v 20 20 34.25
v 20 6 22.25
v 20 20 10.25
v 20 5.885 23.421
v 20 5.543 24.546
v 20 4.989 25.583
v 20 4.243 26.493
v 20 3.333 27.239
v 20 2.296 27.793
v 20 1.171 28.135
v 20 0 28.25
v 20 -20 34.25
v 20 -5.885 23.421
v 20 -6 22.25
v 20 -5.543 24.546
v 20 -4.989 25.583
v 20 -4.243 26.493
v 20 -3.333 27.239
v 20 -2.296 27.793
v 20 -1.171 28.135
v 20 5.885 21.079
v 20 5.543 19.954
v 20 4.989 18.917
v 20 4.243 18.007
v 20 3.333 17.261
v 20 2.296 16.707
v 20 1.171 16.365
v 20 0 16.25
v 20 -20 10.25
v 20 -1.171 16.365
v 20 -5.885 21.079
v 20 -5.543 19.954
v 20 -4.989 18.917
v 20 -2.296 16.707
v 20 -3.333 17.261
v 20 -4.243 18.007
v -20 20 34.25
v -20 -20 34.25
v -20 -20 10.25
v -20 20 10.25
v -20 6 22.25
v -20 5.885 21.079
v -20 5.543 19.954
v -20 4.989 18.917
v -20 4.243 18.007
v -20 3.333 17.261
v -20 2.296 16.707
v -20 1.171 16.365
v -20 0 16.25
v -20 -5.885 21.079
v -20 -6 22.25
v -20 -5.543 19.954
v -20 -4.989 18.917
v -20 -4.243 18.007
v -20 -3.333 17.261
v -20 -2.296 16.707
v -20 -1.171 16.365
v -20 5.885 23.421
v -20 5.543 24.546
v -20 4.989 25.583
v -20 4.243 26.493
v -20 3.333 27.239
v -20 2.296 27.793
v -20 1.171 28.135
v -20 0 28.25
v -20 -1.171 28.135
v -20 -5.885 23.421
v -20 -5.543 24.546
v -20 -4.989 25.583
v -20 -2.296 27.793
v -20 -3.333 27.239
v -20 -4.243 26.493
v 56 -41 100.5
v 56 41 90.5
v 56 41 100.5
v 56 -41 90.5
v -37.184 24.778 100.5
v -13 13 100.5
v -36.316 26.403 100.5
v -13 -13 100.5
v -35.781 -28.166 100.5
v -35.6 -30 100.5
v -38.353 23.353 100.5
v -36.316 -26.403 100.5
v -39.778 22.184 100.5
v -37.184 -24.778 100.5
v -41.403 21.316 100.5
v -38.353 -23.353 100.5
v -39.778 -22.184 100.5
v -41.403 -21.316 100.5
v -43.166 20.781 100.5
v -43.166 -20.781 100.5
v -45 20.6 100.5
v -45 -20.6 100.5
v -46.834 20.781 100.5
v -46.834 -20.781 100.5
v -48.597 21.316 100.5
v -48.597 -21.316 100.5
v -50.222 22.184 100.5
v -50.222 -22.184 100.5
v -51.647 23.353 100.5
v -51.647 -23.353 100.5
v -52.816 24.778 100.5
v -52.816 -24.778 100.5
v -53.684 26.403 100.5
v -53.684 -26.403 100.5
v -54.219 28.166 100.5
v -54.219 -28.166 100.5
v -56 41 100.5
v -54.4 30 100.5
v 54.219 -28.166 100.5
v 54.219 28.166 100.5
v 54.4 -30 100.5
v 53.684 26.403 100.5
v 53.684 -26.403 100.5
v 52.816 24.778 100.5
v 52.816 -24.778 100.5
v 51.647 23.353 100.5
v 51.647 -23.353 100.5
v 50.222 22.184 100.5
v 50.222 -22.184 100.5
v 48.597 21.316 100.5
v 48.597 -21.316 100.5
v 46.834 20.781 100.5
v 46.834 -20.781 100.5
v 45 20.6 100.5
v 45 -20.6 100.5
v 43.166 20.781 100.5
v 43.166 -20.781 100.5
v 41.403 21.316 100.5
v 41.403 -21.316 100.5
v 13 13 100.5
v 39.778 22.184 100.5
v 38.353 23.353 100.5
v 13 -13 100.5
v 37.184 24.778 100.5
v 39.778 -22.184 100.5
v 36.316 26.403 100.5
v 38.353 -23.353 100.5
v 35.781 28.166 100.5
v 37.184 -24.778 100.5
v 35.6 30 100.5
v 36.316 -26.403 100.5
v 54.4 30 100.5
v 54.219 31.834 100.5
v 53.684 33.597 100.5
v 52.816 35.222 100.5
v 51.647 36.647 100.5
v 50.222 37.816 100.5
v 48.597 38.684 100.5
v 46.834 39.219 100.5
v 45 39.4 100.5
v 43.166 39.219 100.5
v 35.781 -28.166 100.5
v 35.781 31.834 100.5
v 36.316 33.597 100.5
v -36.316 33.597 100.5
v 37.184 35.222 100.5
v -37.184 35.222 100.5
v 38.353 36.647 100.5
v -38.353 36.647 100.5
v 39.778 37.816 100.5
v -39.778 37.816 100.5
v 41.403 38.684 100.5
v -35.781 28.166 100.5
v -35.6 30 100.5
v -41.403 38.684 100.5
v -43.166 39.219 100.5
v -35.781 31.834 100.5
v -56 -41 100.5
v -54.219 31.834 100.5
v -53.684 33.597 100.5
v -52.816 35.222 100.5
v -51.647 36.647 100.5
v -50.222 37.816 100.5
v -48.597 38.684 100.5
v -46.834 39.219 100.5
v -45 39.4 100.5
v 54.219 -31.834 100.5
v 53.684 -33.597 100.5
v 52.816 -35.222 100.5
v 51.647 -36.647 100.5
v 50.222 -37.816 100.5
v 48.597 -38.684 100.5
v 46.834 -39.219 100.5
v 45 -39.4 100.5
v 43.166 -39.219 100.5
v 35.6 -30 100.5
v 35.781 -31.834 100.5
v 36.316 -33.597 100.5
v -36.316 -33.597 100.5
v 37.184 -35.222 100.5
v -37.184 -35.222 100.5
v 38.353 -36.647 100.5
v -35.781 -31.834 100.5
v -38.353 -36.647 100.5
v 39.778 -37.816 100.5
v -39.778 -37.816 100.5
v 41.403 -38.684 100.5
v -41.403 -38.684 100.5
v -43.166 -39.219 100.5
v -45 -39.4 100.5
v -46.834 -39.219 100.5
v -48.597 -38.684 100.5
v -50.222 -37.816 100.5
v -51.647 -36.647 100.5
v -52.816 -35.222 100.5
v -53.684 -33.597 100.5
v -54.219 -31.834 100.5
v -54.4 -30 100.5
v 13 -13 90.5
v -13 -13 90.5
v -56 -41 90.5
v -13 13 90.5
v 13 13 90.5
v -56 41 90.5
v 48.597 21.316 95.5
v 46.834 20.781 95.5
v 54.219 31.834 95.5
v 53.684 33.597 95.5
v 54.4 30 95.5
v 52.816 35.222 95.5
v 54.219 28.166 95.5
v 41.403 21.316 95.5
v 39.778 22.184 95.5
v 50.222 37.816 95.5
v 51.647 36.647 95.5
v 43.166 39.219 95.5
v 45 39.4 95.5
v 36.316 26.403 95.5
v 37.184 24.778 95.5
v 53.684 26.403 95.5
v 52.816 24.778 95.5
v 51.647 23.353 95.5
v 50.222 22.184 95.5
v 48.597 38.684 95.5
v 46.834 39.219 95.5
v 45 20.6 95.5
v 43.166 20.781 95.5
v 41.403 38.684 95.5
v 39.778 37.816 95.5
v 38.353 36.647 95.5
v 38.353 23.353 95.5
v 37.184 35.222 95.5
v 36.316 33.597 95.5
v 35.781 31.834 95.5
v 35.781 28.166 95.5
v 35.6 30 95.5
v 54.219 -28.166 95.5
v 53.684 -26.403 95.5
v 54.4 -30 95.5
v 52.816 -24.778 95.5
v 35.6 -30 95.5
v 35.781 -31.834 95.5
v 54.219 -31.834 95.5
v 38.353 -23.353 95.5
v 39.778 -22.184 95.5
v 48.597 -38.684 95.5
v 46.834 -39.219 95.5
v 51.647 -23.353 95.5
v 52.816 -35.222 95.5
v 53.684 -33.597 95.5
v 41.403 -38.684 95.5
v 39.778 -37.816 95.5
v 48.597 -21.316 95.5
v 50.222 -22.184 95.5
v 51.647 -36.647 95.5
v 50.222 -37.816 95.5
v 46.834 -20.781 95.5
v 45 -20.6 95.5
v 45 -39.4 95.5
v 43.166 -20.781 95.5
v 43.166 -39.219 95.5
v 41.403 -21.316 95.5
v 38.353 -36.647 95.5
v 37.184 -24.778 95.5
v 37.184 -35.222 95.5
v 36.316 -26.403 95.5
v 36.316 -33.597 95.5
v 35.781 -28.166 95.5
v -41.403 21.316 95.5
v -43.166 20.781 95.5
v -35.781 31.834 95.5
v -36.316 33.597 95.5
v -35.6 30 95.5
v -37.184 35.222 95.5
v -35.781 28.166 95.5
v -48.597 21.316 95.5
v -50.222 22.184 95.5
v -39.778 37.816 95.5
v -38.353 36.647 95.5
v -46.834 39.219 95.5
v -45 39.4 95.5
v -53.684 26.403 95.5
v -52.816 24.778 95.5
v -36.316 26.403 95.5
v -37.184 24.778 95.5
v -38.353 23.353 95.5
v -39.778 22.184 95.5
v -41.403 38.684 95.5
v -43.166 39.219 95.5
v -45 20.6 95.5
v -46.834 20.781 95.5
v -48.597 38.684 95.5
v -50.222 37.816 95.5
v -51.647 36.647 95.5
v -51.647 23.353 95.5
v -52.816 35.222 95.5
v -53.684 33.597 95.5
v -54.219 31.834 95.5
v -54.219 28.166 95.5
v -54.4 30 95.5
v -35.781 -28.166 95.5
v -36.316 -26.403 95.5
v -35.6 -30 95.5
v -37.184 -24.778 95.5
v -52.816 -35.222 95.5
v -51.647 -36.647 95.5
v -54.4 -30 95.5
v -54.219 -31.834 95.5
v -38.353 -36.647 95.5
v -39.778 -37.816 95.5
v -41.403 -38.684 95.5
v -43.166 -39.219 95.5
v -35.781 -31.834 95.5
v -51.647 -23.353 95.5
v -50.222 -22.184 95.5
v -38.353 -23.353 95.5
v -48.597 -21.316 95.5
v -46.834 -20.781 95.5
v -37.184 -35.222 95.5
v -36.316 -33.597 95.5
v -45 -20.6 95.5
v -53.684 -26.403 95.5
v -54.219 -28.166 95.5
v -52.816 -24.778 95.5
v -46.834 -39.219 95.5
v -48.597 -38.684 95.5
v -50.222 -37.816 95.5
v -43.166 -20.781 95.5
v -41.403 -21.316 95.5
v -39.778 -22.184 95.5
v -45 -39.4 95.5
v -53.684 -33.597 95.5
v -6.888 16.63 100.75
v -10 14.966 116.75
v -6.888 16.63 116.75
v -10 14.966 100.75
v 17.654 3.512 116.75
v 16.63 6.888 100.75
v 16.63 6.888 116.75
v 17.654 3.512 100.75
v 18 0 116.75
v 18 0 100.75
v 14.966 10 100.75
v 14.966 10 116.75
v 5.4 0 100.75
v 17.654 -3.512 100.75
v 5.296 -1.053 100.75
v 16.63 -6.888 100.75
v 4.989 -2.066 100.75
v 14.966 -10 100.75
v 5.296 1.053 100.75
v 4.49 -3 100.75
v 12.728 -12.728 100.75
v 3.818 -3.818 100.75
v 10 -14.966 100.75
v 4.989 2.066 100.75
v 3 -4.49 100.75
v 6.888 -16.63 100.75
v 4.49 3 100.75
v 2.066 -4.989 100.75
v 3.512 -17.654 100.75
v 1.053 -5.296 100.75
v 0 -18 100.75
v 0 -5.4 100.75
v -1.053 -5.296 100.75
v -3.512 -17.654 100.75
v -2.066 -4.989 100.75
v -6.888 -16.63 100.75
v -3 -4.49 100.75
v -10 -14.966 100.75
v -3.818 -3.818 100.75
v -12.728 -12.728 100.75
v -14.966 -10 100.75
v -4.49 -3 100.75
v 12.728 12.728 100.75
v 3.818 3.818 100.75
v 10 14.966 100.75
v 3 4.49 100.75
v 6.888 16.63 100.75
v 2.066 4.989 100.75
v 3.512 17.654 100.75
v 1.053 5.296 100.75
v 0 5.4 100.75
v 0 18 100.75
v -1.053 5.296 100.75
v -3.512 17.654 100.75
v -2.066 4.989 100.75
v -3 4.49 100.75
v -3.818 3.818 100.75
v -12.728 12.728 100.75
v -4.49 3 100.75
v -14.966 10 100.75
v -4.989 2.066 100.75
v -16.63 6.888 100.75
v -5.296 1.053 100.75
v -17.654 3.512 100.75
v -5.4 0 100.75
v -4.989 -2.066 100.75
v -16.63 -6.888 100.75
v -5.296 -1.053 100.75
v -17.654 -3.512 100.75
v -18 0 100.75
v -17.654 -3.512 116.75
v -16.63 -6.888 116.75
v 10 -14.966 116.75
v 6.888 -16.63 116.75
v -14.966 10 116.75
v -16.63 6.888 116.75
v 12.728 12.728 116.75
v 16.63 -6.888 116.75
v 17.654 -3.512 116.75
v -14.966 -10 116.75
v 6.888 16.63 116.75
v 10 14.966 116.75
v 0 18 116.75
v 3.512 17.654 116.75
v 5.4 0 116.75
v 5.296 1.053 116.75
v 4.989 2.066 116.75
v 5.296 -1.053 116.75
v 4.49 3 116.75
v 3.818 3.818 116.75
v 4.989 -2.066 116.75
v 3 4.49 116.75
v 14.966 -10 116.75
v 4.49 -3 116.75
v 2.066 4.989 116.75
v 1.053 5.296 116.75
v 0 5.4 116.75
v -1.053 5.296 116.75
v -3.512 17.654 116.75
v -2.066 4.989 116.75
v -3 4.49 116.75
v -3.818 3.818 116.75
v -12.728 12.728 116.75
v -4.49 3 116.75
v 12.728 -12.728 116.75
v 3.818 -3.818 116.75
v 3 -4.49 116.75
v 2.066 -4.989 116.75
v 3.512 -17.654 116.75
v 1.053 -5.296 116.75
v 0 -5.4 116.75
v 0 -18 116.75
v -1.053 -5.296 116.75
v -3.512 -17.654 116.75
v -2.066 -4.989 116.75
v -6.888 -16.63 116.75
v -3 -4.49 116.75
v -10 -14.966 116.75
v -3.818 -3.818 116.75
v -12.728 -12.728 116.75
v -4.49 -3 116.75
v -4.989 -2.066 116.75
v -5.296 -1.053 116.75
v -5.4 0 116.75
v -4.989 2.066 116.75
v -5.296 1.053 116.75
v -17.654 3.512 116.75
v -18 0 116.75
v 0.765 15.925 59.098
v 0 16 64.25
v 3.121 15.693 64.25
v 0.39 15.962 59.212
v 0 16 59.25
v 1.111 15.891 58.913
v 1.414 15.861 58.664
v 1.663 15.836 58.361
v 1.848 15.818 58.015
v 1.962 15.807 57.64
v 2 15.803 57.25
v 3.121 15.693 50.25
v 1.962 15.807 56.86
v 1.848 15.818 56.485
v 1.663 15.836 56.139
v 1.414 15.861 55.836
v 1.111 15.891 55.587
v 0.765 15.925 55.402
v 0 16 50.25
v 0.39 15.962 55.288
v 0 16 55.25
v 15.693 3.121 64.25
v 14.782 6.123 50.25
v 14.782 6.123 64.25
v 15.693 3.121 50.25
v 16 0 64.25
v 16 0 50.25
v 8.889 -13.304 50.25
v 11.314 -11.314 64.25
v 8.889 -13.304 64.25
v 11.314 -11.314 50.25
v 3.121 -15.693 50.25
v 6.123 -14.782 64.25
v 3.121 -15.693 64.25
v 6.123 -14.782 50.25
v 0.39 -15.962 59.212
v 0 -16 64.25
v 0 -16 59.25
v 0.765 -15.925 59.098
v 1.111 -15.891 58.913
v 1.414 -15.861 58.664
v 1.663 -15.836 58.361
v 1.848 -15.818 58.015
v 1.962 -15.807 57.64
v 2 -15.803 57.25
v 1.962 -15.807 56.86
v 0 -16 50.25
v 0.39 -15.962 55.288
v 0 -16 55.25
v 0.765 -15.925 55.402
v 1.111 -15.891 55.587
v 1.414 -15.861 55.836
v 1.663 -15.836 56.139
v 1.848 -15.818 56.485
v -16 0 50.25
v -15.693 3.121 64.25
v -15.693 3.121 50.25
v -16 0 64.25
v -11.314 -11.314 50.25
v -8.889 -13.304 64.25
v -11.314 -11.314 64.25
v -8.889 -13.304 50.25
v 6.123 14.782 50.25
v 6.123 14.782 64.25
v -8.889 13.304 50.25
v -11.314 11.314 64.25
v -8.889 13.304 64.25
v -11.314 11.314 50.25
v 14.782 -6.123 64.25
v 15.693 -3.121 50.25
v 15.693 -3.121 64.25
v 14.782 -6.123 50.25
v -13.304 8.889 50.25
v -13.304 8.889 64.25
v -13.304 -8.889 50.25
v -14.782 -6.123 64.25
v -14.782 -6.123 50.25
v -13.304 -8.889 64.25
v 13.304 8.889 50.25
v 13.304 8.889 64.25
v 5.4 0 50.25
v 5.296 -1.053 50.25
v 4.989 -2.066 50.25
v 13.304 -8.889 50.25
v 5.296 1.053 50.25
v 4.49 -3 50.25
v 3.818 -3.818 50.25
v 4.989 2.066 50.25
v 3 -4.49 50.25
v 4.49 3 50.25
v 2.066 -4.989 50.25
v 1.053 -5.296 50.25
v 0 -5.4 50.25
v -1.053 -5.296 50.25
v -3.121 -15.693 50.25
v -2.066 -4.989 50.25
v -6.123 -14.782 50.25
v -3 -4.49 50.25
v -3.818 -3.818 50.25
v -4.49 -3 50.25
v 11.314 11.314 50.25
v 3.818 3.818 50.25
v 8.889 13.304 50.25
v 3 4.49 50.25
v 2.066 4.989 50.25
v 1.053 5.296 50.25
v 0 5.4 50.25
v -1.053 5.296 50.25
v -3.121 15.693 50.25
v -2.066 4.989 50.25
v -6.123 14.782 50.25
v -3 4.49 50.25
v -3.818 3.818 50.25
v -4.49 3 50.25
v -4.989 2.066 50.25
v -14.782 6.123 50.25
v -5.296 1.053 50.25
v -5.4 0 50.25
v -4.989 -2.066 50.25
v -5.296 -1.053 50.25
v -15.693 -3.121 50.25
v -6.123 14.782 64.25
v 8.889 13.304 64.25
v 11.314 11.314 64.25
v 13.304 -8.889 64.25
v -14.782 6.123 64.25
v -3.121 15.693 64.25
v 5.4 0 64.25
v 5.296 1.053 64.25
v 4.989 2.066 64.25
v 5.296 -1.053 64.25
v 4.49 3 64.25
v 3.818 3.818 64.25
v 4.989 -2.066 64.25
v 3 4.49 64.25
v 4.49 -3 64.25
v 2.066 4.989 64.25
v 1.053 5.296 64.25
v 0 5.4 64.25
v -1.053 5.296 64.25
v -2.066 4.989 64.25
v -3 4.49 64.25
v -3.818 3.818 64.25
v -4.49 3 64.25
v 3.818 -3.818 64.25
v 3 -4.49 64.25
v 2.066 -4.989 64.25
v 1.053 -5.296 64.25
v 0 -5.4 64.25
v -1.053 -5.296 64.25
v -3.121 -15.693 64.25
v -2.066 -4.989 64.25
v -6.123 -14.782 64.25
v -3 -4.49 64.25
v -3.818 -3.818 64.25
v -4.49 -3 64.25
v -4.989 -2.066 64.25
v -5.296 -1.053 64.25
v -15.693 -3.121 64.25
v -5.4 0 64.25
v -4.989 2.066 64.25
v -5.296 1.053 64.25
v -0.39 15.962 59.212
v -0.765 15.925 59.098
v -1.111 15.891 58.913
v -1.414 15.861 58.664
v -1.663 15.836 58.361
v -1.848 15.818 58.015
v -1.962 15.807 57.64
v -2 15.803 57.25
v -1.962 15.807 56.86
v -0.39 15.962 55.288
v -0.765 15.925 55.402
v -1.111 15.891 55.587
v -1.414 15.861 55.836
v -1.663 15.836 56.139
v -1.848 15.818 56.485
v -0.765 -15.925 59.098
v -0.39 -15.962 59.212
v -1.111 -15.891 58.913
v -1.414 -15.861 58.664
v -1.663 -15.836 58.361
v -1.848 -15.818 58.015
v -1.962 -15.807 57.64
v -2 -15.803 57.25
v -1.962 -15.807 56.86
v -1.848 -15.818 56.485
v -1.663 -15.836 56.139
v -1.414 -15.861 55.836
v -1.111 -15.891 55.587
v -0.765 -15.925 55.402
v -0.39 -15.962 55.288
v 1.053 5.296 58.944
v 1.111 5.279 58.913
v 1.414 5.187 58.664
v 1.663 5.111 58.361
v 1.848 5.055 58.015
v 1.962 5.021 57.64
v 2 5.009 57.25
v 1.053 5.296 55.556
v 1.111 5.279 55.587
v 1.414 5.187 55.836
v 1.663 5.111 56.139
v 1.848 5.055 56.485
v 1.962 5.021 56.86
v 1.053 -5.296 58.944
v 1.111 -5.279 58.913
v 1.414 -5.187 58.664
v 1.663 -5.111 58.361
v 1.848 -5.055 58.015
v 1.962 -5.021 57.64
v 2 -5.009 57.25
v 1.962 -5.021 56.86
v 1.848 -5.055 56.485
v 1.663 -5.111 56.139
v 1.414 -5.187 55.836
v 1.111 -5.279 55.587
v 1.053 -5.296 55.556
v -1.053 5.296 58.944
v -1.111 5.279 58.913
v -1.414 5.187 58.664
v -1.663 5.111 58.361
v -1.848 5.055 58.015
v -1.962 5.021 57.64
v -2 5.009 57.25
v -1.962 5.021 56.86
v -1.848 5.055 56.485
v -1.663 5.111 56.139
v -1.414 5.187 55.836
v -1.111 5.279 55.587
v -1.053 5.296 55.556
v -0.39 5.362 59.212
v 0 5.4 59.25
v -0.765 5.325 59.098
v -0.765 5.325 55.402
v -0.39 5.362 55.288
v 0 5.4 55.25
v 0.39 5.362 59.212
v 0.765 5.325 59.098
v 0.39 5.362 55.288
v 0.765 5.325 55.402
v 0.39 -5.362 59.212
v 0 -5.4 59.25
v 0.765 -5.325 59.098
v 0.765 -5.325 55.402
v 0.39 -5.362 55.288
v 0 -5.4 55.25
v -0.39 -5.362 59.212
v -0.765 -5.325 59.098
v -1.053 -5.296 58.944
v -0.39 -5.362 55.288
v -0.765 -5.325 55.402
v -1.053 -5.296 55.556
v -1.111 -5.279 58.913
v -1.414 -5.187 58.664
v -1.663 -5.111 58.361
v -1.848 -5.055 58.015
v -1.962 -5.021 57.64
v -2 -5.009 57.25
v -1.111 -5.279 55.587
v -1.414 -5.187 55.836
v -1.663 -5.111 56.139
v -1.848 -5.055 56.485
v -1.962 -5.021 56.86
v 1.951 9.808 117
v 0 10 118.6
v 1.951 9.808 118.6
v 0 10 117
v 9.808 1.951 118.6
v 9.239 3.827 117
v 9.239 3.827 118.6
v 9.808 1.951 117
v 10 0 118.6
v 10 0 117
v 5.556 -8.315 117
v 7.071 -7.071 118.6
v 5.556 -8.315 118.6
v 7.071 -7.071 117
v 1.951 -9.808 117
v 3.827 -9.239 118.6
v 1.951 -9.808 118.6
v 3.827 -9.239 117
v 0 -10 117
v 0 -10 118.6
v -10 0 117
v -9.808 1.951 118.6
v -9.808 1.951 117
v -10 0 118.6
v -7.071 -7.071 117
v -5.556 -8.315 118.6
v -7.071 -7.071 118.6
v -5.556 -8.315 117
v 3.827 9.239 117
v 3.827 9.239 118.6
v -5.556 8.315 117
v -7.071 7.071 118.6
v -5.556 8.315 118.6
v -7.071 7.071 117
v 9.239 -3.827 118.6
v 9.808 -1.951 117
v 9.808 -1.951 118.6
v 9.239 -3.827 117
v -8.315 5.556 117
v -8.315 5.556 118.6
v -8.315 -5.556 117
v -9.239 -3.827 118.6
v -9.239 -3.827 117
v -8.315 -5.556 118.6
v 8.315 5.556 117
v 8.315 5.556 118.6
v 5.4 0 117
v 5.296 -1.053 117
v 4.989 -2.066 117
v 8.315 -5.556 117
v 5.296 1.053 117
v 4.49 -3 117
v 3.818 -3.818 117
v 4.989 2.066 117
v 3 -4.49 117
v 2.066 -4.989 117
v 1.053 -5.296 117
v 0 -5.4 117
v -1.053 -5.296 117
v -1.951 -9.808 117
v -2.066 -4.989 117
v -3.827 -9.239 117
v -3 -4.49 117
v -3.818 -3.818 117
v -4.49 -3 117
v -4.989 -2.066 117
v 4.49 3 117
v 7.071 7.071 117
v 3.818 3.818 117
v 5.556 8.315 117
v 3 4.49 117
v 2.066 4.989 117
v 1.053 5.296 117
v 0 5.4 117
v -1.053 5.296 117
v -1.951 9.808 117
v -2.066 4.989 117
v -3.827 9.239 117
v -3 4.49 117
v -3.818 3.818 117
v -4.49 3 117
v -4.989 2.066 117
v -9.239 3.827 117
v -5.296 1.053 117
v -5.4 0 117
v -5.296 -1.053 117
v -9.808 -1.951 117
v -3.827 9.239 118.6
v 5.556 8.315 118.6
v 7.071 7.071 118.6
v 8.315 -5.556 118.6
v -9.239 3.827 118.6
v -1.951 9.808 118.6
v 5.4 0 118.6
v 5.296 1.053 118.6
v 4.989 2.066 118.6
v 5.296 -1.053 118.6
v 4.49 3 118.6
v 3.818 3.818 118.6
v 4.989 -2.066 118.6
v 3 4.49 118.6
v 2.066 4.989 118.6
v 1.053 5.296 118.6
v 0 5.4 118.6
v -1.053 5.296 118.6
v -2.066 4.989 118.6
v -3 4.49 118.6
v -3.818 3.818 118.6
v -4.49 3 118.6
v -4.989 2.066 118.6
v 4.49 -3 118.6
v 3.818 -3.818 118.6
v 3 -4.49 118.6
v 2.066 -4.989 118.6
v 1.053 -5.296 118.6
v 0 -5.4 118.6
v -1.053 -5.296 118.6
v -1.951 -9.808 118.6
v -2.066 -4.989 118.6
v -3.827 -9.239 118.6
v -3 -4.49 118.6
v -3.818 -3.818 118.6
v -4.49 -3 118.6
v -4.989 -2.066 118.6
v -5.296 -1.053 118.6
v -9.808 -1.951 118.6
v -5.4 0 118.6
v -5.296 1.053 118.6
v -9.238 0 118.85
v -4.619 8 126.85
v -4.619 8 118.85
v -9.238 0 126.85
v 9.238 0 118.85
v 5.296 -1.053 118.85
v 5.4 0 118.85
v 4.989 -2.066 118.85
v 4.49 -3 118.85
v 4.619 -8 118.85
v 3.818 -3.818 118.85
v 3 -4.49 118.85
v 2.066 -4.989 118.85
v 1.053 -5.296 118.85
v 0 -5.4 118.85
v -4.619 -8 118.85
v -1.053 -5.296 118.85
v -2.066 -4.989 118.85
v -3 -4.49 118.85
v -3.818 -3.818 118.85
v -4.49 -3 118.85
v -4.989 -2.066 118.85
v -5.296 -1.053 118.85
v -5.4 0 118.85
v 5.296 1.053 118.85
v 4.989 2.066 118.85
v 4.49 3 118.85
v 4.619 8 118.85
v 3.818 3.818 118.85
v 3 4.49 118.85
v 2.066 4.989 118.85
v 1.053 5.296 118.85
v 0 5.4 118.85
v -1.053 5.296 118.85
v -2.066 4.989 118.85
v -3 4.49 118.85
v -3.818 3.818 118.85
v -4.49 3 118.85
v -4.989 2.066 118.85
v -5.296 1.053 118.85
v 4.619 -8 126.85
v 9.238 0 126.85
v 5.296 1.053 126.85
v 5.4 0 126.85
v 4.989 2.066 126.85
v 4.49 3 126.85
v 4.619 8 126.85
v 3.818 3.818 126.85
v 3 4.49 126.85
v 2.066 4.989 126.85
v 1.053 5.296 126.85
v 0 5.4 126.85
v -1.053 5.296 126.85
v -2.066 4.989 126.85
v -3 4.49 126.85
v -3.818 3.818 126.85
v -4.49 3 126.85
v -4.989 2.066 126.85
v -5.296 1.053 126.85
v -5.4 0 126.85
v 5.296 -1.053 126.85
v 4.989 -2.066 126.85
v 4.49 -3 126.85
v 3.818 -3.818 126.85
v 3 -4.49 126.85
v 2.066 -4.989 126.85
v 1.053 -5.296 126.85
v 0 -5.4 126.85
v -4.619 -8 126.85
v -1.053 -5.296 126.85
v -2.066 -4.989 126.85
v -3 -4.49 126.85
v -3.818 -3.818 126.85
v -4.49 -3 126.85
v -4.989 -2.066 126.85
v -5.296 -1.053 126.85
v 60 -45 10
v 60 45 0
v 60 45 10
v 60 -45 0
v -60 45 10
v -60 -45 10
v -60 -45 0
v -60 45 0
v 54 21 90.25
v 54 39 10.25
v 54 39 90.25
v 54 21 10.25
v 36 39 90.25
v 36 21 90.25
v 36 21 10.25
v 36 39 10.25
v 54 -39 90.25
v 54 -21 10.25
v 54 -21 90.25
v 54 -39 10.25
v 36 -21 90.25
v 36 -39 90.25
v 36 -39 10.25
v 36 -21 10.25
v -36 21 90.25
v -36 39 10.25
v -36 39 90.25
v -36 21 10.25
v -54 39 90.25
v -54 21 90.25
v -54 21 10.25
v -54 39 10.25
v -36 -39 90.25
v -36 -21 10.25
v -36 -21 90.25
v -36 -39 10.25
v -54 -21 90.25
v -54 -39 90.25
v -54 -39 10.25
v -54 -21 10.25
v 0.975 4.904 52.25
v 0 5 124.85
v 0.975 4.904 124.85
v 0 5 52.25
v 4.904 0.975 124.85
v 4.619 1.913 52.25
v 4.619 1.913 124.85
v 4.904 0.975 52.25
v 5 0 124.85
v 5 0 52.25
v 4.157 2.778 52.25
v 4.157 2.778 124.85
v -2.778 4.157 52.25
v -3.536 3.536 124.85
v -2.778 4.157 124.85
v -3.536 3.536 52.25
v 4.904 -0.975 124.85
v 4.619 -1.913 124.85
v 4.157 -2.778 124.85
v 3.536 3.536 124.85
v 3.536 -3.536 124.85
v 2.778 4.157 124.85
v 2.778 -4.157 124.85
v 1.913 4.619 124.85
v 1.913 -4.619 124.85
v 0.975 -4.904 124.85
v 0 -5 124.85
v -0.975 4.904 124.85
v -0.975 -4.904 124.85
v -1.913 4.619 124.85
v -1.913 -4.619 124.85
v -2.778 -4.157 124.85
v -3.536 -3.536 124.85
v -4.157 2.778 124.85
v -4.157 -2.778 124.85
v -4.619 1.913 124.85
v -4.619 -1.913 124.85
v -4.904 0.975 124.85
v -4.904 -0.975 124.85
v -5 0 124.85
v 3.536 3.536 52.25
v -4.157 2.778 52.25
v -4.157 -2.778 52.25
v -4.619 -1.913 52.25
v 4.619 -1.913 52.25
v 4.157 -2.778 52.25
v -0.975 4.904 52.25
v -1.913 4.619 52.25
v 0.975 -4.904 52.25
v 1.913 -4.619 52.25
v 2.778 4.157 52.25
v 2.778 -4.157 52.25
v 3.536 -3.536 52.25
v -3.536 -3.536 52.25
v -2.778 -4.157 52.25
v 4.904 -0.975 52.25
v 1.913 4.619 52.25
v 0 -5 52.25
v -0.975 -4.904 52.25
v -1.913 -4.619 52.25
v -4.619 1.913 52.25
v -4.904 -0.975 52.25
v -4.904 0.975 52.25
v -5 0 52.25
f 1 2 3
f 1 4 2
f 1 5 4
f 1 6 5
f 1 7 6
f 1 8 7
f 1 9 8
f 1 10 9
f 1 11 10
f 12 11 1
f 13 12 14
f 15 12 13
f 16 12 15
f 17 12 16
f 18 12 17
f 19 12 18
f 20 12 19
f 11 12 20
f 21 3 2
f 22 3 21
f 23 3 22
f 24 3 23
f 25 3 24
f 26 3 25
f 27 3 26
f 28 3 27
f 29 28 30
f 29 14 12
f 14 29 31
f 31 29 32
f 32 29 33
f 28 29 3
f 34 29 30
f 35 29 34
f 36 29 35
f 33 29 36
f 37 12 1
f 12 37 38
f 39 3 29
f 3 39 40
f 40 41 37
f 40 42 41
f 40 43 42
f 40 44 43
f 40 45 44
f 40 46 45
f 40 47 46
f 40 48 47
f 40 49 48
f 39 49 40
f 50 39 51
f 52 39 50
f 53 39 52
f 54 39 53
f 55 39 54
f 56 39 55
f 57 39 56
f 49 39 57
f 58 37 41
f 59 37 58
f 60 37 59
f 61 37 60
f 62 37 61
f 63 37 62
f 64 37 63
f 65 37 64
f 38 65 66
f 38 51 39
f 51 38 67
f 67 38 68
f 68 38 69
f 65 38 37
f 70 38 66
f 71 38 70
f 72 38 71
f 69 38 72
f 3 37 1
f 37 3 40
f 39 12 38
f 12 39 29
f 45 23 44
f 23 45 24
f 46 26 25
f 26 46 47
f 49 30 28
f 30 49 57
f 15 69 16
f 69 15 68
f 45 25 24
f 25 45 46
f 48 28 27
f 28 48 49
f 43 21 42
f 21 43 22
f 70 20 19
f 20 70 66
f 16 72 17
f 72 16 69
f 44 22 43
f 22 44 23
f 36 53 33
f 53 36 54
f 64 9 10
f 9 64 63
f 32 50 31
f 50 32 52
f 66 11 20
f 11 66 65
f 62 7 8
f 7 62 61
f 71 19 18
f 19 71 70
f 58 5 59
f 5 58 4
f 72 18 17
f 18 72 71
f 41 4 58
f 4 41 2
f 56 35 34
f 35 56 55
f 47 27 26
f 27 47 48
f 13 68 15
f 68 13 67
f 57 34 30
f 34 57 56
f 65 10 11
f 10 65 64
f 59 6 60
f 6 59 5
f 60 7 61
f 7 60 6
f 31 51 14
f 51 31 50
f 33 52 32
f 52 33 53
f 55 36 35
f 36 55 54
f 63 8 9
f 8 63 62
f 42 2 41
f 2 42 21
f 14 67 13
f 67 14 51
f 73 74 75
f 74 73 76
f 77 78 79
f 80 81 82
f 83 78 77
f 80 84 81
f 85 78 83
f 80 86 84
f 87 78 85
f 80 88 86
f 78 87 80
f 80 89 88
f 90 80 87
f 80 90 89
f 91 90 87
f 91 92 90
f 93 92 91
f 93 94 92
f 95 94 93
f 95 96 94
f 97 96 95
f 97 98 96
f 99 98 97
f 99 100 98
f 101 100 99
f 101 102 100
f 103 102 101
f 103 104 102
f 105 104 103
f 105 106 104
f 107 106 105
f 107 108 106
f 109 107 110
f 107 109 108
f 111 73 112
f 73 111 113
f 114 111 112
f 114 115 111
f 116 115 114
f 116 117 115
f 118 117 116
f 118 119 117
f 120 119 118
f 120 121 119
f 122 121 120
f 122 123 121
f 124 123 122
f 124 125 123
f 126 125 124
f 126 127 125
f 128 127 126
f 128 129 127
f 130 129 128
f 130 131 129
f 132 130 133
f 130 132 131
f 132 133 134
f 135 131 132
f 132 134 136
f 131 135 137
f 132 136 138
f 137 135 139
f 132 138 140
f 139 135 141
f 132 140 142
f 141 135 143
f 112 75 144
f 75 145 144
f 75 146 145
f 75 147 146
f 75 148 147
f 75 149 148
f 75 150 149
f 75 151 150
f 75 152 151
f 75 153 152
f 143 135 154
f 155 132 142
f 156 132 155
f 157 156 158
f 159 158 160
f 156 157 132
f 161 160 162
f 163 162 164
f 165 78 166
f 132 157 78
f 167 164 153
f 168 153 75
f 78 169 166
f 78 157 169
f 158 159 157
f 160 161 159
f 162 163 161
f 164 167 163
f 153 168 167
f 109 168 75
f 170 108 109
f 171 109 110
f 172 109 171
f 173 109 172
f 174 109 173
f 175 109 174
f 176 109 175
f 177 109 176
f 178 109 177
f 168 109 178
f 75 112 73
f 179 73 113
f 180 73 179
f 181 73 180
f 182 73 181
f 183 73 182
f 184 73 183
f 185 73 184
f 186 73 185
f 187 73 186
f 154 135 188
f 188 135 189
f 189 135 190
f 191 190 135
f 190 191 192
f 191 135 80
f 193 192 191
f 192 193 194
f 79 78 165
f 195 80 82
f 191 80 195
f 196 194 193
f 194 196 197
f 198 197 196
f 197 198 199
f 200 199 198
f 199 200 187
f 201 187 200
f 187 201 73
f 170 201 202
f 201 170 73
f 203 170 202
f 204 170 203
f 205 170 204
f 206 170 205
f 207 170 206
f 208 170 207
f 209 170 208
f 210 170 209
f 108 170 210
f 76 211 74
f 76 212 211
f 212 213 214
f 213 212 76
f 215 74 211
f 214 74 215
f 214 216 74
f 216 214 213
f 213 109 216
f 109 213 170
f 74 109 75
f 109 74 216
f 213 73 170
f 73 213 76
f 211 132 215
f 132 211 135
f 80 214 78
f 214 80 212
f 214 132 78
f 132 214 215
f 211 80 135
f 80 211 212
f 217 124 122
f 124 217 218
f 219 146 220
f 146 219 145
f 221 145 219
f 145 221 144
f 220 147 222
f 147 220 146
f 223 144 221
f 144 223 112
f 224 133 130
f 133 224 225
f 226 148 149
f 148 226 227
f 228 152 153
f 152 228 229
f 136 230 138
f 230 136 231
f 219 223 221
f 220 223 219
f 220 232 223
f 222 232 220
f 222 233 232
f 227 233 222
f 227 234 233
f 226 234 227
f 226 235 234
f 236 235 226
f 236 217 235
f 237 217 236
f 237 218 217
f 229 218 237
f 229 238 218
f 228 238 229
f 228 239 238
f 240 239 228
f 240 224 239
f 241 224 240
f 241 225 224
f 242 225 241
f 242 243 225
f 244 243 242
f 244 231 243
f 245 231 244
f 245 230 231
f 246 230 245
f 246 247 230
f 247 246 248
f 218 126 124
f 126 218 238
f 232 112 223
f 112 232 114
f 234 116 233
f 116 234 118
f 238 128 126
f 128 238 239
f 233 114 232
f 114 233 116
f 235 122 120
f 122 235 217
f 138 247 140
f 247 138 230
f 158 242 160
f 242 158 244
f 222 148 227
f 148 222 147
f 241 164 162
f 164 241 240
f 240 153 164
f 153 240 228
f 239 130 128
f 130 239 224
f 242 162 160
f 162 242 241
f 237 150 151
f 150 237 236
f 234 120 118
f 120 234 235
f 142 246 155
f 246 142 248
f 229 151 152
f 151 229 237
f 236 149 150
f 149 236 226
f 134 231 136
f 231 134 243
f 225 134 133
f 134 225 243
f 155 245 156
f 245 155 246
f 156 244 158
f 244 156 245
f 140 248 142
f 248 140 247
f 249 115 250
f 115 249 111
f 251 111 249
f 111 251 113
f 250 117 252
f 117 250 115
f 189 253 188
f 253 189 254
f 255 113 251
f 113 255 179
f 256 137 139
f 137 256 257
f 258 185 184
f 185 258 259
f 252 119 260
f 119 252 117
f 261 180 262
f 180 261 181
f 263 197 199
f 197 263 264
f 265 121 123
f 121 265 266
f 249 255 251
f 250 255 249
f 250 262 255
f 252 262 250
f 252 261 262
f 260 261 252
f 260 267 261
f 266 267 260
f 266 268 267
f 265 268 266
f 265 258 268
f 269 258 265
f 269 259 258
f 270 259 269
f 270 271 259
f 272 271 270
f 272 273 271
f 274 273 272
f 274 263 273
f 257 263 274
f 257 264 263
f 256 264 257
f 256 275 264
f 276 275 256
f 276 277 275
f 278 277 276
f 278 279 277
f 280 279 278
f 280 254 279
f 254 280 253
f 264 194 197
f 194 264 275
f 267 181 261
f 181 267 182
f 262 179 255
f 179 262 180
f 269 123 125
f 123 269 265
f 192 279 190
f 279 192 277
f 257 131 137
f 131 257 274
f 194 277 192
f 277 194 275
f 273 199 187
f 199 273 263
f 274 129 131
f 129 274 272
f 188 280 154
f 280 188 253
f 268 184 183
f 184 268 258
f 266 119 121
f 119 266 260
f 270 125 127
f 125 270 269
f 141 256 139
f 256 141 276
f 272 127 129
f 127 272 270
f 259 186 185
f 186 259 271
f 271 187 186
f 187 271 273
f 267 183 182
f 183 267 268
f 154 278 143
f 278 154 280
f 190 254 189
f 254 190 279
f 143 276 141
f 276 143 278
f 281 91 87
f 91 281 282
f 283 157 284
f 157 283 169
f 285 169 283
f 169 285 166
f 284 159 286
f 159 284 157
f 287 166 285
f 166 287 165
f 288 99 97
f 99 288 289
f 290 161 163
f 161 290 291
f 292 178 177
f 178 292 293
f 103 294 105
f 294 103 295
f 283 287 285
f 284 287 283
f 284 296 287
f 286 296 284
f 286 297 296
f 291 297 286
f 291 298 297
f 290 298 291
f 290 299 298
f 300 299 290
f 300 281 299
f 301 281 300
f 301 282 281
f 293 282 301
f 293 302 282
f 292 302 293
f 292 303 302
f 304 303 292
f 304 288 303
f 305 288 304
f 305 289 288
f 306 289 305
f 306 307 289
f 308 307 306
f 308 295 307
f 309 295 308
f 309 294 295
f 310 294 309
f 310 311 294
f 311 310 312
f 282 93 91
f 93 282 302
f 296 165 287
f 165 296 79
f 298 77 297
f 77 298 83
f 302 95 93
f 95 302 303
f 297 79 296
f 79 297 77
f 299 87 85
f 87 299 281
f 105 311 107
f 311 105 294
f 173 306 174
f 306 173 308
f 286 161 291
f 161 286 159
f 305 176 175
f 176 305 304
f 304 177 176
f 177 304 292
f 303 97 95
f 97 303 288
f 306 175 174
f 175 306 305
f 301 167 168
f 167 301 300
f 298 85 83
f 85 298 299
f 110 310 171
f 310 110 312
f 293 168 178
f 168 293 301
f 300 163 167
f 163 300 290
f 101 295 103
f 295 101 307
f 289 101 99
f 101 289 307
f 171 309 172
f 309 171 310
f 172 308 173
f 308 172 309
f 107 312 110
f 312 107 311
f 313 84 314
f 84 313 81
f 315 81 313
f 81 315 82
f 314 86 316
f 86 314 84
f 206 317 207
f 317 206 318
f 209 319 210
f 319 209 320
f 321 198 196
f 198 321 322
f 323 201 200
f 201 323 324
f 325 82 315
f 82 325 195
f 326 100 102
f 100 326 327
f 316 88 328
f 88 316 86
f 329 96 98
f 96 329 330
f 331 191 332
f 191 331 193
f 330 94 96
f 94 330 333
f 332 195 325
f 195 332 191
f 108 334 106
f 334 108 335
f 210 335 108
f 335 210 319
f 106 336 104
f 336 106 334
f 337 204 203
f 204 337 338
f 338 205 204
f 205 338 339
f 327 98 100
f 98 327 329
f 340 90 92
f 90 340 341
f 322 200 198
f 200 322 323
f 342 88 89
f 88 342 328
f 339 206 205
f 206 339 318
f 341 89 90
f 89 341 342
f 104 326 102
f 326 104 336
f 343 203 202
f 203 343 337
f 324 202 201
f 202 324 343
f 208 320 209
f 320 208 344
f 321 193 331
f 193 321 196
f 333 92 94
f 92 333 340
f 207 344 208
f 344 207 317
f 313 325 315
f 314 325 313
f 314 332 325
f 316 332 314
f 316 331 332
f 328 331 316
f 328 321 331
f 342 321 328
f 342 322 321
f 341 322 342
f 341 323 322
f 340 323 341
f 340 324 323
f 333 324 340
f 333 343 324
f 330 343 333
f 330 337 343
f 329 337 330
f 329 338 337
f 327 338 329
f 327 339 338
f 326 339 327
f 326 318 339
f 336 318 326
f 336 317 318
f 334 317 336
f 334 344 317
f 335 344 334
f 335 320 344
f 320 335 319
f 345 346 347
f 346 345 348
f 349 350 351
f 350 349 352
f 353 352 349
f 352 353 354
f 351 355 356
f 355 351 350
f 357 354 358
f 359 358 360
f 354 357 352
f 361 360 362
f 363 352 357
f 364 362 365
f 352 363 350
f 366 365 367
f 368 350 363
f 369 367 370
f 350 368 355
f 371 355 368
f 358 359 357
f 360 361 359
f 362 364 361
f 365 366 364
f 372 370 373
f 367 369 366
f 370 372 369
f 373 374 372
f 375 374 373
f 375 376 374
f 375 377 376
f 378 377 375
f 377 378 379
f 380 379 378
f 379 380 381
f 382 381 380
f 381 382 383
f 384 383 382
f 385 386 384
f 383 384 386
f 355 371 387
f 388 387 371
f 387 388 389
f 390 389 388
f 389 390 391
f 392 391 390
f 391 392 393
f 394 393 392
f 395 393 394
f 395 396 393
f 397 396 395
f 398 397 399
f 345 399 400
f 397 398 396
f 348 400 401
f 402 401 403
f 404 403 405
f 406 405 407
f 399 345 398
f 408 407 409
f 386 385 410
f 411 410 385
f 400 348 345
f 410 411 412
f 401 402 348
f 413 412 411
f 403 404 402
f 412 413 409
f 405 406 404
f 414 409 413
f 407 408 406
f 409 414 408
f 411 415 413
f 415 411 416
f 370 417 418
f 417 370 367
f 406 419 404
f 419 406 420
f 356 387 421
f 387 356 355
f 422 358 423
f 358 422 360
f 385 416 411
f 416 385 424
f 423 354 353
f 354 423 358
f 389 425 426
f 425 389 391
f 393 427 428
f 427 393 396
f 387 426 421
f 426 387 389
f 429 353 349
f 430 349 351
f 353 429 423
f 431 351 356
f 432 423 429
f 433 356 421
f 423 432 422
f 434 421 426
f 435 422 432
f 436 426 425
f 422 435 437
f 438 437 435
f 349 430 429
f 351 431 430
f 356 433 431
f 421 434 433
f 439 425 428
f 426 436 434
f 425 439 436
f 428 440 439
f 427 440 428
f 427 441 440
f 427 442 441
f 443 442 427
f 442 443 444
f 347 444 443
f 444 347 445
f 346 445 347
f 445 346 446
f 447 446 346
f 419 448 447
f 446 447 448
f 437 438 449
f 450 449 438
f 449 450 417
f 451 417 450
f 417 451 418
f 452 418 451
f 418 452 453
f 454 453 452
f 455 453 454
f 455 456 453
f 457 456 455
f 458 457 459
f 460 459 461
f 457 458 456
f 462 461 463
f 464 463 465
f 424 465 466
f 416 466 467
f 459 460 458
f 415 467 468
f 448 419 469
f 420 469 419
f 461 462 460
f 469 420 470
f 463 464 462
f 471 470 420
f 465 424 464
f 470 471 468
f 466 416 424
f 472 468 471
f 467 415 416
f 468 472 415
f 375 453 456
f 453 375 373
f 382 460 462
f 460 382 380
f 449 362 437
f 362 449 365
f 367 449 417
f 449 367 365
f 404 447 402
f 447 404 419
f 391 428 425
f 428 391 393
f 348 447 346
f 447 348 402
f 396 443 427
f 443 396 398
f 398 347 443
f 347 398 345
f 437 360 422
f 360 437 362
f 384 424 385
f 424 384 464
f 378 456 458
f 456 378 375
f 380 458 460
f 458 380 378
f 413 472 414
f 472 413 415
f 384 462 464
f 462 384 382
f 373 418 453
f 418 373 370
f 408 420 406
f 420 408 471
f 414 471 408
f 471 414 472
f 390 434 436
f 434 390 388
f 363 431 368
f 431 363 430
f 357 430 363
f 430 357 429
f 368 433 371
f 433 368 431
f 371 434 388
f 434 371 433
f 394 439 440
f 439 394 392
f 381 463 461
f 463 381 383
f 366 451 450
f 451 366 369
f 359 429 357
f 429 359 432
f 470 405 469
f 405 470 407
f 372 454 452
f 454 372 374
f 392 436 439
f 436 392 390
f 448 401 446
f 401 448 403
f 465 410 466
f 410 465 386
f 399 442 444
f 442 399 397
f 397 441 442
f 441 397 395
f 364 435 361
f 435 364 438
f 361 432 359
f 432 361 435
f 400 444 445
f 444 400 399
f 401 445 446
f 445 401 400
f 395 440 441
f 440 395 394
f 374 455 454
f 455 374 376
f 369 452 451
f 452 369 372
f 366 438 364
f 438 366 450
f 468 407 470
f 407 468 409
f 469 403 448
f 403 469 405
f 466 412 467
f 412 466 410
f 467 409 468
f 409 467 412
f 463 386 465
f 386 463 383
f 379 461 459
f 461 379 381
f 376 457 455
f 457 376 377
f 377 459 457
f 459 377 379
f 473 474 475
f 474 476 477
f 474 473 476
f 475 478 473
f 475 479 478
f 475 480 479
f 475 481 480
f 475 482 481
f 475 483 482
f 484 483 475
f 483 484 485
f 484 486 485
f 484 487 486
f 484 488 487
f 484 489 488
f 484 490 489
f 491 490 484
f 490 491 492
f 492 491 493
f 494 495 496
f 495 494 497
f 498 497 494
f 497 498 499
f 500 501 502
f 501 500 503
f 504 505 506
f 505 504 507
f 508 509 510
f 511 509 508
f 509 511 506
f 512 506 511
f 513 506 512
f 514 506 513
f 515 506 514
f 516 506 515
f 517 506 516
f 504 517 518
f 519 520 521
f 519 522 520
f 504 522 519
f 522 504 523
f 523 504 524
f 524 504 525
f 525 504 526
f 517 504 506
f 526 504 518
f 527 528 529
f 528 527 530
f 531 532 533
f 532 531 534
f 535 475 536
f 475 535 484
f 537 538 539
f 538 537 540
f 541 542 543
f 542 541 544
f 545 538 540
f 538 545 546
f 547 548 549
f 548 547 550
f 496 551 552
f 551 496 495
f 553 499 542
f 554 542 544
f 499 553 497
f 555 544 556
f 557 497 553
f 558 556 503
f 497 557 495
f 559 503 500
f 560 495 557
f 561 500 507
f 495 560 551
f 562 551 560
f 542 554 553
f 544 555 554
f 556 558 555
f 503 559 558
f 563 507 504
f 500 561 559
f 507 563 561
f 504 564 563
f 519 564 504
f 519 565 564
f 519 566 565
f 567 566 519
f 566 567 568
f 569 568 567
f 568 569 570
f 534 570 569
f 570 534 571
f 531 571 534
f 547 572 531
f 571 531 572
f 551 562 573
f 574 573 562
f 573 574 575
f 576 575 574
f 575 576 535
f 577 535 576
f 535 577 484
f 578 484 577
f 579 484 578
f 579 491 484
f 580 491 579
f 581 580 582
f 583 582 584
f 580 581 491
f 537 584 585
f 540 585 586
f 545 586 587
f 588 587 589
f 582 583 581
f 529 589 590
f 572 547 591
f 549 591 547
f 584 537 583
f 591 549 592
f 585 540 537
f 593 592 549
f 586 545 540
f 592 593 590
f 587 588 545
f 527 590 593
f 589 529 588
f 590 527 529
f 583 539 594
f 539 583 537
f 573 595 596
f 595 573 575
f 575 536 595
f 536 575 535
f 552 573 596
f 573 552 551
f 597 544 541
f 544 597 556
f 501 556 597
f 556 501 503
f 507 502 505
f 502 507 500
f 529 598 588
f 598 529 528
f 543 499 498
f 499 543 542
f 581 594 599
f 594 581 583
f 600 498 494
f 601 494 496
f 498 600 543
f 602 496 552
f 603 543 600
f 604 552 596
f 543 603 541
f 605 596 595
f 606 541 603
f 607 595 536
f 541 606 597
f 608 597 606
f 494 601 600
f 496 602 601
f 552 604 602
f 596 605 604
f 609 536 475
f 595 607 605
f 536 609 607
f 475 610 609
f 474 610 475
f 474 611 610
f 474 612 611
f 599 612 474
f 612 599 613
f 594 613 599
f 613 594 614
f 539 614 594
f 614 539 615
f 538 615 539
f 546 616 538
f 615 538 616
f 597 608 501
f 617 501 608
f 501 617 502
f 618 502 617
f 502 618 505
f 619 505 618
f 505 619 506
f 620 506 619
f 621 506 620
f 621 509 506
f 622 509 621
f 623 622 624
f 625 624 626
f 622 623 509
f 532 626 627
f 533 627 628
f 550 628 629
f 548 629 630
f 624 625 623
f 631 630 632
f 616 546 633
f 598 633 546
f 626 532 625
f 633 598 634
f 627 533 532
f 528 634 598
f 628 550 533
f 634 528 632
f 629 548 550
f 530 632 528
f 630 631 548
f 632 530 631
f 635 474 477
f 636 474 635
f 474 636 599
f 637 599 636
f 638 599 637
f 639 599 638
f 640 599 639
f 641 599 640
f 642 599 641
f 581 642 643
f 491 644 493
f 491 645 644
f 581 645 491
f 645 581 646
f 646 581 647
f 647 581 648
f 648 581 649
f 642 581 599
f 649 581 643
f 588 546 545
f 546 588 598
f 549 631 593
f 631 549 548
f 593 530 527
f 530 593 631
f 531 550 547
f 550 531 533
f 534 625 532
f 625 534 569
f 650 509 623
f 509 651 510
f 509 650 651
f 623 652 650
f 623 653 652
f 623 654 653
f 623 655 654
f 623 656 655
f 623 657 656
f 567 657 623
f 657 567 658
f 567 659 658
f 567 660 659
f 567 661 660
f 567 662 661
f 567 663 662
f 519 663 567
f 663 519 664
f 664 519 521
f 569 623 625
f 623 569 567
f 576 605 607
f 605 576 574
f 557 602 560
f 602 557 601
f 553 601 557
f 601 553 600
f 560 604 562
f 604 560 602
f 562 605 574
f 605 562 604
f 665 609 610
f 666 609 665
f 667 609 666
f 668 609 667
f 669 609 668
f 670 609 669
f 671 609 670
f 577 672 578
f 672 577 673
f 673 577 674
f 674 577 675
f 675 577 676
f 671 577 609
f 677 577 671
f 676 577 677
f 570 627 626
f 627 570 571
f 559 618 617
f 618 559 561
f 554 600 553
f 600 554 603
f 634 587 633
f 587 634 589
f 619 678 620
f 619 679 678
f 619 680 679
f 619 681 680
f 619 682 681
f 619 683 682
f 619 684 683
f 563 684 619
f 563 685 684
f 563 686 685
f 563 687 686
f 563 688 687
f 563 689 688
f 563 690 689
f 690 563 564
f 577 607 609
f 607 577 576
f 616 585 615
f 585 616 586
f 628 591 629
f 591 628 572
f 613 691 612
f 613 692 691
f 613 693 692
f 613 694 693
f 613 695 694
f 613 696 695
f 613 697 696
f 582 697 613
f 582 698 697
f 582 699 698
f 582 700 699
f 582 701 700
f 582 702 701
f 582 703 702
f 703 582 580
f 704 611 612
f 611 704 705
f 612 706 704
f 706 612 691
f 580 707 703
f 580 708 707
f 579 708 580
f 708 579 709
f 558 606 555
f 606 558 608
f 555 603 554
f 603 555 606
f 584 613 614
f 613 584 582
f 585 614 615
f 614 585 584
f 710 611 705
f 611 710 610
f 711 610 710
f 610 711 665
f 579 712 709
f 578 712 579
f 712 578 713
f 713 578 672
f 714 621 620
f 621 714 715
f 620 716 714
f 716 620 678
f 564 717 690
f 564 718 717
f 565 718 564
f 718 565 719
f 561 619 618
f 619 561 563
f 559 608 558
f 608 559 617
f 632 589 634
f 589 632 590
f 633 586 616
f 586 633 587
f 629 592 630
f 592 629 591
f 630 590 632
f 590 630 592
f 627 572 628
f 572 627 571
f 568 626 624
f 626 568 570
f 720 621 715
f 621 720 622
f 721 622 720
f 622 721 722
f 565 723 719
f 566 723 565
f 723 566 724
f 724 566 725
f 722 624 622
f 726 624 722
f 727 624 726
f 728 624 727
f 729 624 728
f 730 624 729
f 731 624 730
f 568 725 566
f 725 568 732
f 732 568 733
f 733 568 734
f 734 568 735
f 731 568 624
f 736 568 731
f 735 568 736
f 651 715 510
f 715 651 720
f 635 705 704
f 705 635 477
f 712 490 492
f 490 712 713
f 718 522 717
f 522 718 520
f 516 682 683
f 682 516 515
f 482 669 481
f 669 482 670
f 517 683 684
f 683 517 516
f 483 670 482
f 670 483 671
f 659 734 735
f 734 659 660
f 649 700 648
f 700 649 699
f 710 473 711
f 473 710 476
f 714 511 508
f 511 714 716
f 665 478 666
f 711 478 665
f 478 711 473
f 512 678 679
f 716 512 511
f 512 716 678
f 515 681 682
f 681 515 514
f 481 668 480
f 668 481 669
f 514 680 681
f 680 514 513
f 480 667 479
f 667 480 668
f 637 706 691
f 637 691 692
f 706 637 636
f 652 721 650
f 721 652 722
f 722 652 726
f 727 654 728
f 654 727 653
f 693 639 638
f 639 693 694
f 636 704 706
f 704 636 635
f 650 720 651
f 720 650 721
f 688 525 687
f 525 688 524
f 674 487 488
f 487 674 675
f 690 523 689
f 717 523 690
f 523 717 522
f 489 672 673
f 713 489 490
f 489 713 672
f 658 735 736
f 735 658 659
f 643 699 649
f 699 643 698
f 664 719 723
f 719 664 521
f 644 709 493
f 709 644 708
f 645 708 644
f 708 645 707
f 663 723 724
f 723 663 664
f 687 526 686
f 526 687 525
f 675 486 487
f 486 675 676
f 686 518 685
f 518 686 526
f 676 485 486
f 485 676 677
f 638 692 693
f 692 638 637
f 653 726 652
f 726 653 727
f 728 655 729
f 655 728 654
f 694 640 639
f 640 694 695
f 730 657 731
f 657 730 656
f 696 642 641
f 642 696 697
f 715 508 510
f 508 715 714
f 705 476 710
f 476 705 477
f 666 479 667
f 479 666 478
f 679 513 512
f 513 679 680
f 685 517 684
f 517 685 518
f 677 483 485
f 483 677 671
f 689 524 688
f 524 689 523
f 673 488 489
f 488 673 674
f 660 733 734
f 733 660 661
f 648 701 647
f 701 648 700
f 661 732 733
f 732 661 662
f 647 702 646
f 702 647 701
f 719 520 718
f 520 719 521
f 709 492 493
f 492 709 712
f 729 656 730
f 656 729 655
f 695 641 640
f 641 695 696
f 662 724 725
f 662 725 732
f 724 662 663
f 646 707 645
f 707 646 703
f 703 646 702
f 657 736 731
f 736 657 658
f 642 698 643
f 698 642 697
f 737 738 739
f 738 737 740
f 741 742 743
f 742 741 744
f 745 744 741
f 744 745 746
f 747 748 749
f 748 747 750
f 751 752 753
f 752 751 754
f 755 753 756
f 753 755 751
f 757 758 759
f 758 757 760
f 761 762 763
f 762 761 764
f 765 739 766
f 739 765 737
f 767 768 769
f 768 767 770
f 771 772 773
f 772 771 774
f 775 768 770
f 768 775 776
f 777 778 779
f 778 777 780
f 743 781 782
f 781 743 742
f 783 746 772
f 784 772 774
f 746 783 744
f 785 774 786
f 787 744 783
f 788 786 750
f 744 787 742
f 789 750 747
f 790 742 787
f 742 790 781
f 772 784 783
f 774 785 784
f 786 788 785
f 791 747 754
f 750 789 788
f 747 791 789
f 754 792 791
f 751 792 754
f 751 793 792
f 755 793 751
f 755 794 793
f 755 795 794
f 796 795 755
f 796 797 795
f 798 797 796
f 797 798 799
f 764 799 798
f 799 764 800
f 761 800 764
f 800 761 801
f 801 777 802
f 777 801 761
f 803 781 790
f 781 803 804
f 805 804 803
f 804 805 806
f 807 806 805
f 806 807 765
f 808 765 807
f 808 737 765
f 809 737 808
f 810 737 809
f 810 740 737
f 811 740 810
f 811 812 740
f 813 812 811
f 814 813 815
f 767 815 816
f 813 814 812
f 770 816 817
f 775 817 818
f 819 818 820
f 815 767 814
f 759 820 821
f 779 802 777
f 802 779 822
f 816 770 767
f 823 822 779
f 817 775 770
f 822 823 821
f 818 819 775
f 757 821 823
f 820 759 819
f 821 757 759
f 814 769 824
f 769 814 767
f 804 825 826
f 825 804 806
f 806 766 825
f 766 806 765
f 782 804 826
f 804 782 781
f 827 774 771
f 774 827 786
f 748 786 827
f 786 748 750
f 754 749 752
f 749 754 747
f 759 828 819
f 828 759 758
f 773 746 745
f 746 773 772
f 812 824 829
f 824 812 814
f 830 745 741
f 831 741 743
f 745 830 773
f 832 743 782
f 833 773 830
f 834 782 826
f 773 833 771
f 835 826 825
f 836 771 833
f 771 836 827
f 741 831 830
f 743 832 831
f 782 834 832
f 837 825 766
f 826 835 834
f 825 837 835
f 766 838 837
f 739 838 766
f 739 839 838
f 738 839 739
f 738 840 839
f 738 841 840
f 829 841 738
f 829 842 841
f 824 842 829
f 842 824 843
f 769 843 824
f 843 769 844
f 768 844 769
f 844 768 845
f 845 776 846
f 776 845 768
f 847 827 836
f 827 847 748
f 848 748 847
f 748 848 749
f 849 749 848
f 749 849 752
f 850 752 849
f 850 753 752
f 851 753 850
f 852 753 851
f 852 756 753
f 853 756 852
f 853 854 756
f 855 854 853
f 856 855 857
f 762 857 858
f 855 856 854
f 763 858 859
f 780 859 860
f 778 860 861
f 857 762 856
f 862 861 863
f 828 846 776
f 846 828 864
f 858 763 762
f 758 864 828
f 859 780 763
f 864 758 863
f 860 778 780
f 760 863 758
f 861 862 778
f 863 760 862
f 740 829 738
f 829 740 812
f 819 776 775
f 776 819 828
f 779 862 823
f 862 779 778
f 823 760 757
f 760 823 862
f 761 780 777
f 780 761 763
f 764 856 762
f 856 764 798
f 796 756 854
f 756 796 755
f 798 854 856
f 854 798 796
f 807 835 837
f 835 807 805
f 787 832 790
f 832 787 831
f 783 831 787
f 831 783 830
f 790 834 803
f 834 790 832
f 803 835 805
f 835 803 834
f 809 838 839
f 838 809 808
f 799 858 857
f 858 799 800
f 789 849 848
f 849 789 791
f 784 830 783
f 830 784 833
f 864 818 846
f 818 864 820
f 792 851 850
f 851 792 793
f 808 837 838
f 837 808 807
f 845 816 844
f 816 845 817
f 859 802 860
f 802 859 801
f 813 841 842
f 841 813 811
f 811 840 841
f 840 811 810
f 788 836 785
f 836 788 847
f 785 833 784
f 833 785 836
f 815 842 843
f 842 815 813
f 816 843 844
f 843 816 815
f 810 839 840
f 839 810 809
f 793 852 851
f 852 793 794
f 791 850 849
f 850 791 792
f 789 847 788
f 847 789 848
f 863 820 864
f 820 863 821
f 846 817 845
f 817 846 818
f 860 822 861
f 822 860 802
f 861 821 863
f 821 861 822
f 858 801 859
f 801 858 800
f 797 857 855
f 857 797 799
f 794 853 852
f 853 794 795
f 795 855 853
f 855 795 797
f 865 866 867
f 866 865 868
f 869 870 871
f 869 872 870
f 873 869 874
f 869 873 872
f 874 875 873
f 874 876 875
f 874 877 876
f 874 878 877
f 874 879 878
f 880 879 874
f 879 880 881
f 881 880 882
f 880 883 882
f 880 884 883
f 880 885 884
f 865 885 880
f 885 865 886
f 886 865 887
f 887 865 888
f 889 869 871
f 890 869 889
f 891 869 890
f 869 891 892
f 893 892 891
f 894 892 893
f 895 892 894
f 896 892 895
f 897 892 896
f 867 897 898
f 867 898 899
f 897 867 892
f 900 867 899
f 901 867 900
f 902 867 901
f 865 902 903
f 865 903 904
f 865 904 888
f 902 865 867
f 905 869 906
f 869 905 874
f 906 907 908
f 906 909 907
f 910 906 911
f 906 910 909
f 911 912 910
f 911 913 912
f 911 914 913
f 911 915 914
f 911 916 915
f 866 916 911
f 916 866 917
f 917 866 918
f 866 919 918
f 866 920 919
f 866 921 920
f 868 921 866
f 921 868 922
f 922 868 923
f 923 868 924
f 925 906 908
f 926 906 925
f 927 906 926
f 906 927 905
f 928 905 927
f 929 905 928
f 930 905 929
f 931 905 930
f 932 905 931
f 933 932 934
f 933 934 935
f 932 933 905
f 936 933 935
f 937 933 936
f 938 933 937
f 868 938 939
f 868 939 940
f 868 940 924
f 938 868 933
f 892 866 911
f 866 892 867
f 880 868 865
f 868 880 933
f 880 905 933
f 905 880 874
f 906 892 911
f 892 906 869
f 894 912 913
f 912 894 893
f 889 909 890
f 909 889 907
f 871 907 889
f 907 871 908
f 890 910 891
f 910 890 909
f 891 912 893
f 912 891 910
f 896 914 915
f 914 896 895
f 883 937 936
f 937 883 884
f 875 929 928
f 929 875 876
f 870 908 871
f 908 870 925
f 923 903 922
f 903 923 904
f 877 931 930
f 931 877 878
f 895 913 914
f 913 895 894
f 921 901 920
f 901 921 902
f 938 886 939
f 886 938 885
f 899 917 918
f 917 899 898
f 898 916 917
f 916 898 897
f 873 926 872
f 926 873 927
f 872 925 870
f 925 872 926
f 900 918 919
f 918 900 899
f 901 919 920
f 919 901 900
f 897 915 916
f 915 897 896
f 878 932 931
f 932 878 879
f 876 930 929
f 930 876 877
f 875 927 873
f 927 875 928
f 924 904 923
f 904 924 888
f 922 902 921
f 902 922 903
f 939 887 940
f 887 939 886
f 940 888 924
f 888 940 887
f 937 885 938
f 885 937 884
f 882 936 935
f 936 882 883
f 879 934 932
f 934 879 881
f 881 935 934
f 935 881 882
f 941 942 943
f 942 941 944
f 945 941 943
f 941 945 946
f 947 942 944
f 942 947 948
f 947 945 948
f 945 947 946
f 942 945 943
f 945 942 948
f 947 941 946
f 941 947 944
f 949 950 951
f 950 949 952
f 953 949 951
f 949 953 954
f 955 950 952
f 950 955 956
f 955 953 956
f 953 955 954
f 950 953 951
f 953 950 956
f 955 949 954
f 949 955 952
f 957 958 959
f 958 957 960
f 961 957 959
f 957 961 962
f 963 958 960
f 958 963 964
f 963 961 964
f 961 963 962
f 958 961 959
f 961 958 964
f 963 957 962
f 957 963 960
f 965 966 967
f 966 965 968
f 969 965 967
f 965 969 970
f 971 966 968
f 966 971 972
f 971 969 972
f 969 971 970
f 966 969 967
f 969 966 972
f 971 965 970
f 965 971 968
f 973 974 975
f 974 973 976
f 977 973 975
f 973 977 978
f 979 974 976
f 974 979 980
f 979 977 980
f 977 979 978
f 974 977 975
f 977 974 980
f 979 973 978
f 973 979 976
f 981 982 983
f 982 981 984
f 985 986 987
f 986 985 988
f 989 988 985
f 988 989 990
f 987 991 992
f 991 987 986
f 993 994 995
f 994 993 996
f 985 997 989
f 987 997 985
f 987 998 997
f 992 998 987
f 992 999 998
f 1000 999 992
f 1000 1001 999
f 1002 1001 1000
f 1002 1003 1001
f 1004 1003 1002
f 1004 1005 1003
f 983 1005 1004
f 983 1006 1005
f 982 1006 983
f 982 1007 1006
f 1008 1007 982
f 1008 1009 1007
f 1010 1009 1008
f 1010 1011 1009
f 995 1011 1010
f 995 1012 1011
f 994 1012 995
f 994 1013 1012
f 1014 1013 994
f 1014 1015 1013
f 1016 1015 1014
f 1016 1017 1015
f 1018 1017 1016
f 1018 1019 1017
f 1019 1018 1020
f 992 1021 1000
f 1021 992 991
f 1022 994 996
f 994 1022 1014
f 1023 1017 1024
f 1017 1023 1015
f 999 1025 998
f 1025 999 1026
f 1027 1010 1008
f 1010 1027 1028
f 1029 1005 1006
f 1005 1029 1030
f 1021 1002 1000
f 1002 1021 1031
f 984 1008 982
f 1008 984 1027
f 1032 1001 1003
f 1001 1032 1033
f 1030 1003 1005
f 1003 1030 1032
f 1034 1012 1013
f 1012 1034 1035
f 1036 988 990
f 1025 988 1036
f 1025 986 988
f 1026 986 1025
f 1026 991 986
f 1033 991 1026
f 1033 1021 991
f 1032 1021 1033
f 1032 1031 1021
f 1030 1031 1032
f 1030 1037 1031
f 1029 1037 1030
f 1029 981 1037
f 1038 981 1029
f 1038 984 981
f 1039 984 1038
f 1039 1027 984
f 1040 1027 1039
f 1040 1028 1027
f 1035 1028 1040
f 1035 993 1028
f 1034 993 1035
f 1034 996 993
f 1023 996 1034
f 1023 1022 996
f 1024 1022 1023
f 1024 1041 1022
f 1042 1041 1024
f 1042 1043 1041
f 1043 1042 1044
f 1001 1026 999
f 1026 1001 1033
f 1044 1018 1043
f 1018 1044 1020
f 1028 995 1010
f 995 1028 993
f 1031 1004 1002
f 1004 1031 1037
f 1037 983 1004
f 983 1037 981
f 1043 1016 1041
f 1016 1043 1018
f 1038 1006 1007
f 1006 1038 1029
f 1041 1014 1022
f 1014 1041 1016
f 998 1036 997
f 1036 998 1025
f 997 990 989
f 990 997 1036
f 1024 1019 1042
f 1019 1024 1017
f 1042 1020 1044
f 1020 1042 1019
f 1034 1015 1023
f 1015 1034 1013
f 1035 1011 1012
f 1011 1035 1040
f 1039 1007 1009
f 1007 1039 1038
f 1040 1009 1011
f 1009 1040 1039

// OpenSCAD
$fn = 32;

// ------------------------------------------------------------------------
// Arbor press fixture: screw d10, posts 80 mm, gap 16 mm
// Every part is its own module, assembly() places every instance.
// ------------------------------------------------------------------------

// --- part 1 ---
module press_bed() {
  difference() {
    translate([-60, -45, 0]) cube([120, 90, 10]);
  }
}

// --- part 2 ---
module anvil_block() {
  difference() {
    translate([-20, -20, 0]) cube([40, 40, 24]);
    translate([0, 0, 12]) rotate([0, 90, 0]) cylinder(h = 42, d = 12, center = true);
  }
}

// --- part 3 ---
module press_post_a() {
  translate([-9, -9, 0]) cube([18, 18, 80]);
}

// --- part 4 ---
module press_post_b() {
  translate([-9, -9, 0]) cube([18, 18, 80]);
}

// --- part 5 ---
module press_post_c() {
  translate([-9, -9, 0]) cube([18, 18, 80]);
}

// --- part 6 ---
module press_post_d() {
  translate([-9, -9, 0]) cube([18, 18, 80]);
}

// --- part 7 ---
module press_frame() {
  difference() {
    translate([-56, -41, 0]) cube([112, 82, 10]);
    translate([-13, -13, -1]) cube([26, 26, 12]);
    translate([45, 30, 5]) cylinder(h = 6, d = 18.8);
    translate([45, -30, 5]) cylinder(h = 6, d = 18.8);
    translate([-45, 30, 5]) cylinder(h = 6, d = 18.8);
    translate([-45, -30, 5]) cylinder(h = 6, d = 18.8);
  }
}

// --- part 8 ---
module guide_ring() {
  difference() {
      translate([0, 0, 0]) cylinder(h = 16, d = 36);
      translate([0, 0, -1]) cylinder(h = 18, d = 10.8);
    }
}

// --- part 9 ---
module press_screw() {
  translate([0, 0, -36.3]) cylinder(h = 72.6, d = 10);
}

// --- part 10 ---
module press_head() {
  difference() {
    cylinder(h = 14, d = 32);
    translate([0, 0, -1]) cylinder(h = 16, d = 10.8);
    translate([0, 0, 7]) rotate([90, 0, 0]) cylinder(h = 34, d = 4, center = true);
  }
}

// --- part 11 ---
module nut_washer() {
  difference() {
      translate([0, 0, 0]) cylinder(h = 1.6, d = 20);
      translate([0, 0, -1]) cylinder(h = 3.6, d = 10.8);
    }
}

// --- part 12 ---
module press_nut() {
  difference() {
    linear_extrude(height = 8) polygon(points = [[9.238, 0], [4.619, 8], [-4.619, 8], [-9.238, 0], [-4.619, -8], [4.619, -8]]);
    translate([0, 0, -1]) cylinder(h = 10, d = 10.8);
  }
}

// --- assembly ---
module assembly() {
  color([0.80, 0.24, 0.20]) translate([0, 0, 0]) rotate([0, 0, 0]) press_bed();
  color([0.20, 0.45, 0.75]) translate([0, 0, 10.25]) rotate([0, 0, 0]) anvil_block();
  color([0.25, 0.62, 0.32]) translate([45, 30, 10.25]) rotate([0, 0, 0]) press_post_a();
  color([0.92, 0.70, 0.18]) translate([45, -30, 10.25]) rotate([0, 0, 0]) press_post_b();
  color([0.58, 0.35, 0.70]) translate([-45, 30, 10.25]) rotate([0, 0, 0]) press_post_c();
  color([0.16, 0.66, 0.66]) translate([-45, -30, 10.25]) rotate([0, 0, 0]) press_post_d();
  color([0.85, 0.48, 0.18]) translate([0, 0, 90.5]) rotate([0, 0, 0]) press_frame();
  color([0.55, 0.60, 0.65]) translate([0, 0, 100.75]) rotate([0, 0, 0]) guide_ring();
  color([0.75, 0.30, 0.55]) translate([0, 0, 88.55]) rotate([0, 0, 0]) press_screw();
  color([0.42, 0.52, 0.28]) translate([0, 0, 50.25]) rotate([0, 0, 0]) press_head();
  color([0.80, 0.24, 0.20]) translate([0, 0, 117]) rotate([0, 0, 0]) nut_washer();
  color([0.20, 0.45, 0.75]) translate([0, 0, 118.85]) rotate([0, 0, 0]) press_nut();
}

assembly();
